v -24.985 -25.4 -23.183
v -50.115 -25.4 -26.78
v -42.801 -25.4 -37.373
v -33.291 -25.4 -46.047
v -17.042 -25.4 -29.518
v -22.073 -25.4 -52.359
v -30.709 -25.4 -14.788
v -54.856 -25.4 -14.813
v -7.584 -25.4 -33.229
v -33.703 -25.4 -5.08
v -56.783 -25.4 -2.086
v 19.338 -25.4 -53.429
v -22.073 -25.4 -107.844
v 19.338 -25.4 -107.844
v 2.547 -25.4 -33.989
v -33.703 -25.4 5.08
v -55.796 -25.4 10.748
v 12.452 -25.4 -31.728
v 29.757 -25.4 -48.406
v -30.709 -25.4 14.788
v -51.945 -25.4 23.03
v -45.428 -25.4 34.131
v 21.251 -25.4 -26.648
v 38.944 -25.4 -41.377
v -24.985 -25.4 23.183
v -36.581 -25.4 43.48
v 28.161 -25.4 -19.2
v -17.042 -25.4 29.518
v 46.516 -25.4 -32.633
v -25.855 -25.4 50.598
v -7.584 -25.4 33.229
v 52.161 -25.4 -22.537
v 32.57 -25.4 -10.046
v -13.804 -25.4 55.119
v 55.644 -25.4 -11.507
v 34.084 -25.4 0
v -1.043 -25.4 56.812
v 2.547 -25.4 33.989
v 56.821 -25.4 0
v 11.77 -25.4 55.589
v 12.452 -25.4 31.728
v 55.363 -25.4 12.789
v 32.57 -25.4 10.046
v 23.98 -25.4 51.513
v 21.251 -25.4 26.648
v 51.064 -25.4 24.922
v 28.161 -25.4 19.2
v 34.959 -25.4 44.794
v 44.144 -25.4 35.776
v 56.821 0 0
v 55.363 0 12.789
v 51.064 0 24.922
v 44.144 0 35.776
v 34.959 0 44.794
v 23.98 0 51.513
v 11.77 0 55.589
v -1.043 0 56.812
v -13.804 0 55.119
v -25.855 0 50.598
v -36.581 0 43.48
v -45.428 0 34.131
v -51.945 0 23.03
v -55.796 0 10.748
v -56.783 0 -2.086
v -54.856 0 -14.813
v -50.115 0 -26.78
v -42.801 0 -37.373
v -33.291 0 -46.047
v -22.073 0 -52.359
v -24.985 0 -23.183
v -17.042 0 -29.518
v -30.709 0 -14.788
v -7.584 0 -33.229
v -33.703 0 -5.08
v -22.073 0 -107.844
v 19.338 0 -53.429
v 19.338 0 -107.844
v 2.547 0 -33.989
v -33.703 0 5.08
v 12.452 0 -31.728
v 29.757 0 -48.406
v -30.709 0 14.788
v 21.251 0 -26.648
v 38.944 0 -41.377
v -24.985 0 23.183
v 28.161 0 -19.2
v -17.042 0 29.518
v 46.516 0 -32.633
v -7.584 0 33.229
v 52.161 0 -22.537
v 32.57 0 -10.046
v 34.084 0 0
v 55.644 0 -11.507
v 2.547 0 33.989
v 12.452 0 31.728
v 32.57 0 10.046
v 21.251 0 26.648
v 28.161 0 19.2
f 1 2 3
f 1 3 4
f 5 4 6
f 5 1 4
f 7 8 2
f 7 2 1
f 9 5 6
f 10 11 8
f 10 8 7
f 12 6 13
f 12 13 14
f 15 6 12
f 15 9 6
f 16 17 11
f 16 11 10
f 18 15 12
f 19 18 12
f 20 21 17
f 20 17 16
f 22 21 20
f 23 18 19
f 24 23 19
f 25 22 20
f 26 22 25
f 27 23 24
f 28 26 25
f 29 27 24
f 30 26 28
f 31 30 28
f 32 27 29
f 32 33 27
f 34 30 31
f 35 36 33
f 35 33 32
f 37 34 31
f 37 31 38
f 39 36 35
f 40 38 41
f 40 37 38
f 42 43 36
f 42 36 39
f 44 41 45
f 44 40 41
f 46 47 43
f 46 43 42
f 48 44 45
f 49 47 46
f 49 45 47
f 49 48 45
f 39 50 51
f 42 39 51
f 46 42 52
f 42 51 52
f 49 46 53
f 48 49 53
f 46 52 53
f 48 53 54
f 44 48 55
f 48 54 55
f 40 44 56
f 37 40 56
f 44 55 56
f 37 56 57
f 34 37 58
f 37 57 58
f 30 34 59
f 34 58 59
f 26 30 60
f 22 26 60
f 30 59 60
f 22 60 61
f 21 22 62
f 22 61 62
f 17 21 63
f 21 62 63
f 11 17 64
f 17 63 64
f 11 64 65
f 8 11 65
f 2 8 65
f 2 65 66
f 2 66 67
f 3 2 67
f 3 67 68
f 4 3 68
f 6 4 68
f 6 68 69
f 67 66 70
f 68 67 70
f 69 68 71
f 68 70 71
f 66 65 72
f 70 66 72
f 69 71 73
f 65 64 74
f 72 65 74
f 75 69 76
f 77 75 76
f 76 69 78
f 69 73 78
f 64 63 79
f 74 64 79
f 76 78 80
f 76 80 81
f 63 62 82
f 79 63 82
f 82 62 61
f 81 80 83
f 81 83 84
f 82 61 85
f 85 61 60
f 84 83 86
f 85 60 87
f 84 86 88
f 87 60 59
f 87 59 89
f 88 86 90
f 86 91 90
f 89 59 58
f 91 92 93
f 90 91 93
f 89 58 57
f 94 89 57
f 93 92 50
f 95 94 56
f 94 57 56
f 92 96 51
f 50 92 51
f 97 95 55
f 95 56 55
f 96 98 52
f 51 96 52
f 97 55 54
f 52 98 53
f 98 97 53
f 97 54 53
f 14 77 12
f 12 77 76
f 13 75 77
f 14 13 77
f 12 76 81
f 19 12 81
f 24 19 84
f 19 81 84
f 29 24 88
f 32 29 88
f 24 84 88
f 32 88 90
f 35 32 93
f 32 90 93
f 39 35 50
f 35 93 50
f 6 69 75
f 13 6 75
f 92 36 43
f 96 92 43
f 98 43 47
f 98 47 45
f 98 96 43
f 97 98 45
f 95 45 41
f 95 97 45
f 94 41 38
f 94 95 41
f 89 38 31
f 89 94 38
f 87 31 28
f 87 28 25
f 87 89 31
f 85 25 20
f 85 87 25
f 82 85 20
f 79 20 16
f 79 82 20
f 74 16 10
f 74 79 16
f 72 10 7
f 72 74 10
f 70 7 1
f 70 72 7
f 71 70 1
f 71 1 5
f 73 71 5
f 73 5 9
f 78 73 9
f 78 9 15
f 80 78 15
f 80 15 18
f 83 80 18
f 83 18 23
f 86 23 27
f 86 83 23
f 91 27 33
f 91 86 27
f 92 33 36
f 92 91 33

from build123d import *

# Parameters (mm, degrees)
F0_R     = 34.0839137212
F1_DEPTH = 25.4


with BuildPart() as f1:
    # F0 (on Front) → F1 (new body)
    with BuildSketch(Plane.XZ):
        with BuildLine():
            ThreePointArc((19.3380191922, -53.4293892983), (46.5159637147, -32.6331694256), (56.8212867424, 0))
            ThreePointArc((56.8212867424, 0), (-31.4202012773, 47.3437385381), (-22.0727231354, -52.3588915129))
            Line((-22.0727231354, -52.3588915129), (-22.0727231354, -44.1123396158))
            Line((-22.0727231354, -44.1123396158), (19.3380191922, -44.1123396158))
            Line((19.3380191922, -44.1123396158), (19.3380191922, -53.4293892983))
        make_face()
        Circle(F0_R, mode=Mode.SUBTRACT)
        with BuildLine():
            Line((-22.0727231354, -44.1123396158), (-22.0727231354, -52.3588915129))
            ThreePointArc((-22.0727231354, -52.3588915129), (-1.4683810103, -56.802310554), (19.3380191922, -53.4293892983))
            Line((19.3380191922, -53.4293892983), (19.3380191922, -44.1123396158))
            Line((19.3380191922, -44.1123396158), (-22.0727231354, -44.1123396158))
        make_face()
        with BuildLine():
            ThreePointArc((19.3380191922, -53.4293892983), (-1.4683810103, -56.802310554), (-22.0727231354, -52.3588915129))
            Line((-22.0727231354, -52.3588915129), (-22.0727231354, -107.8437715769))
            Line((-22.0727231354, -107.8437715769), (19.3380191922, -107.8437715769))
            Line((19.3380191922, -107.8437715769), (19.3380191922, -53.4293892983))
        make_face()
    extrude(amount=F1_DEPTH)


solid = f1.part
